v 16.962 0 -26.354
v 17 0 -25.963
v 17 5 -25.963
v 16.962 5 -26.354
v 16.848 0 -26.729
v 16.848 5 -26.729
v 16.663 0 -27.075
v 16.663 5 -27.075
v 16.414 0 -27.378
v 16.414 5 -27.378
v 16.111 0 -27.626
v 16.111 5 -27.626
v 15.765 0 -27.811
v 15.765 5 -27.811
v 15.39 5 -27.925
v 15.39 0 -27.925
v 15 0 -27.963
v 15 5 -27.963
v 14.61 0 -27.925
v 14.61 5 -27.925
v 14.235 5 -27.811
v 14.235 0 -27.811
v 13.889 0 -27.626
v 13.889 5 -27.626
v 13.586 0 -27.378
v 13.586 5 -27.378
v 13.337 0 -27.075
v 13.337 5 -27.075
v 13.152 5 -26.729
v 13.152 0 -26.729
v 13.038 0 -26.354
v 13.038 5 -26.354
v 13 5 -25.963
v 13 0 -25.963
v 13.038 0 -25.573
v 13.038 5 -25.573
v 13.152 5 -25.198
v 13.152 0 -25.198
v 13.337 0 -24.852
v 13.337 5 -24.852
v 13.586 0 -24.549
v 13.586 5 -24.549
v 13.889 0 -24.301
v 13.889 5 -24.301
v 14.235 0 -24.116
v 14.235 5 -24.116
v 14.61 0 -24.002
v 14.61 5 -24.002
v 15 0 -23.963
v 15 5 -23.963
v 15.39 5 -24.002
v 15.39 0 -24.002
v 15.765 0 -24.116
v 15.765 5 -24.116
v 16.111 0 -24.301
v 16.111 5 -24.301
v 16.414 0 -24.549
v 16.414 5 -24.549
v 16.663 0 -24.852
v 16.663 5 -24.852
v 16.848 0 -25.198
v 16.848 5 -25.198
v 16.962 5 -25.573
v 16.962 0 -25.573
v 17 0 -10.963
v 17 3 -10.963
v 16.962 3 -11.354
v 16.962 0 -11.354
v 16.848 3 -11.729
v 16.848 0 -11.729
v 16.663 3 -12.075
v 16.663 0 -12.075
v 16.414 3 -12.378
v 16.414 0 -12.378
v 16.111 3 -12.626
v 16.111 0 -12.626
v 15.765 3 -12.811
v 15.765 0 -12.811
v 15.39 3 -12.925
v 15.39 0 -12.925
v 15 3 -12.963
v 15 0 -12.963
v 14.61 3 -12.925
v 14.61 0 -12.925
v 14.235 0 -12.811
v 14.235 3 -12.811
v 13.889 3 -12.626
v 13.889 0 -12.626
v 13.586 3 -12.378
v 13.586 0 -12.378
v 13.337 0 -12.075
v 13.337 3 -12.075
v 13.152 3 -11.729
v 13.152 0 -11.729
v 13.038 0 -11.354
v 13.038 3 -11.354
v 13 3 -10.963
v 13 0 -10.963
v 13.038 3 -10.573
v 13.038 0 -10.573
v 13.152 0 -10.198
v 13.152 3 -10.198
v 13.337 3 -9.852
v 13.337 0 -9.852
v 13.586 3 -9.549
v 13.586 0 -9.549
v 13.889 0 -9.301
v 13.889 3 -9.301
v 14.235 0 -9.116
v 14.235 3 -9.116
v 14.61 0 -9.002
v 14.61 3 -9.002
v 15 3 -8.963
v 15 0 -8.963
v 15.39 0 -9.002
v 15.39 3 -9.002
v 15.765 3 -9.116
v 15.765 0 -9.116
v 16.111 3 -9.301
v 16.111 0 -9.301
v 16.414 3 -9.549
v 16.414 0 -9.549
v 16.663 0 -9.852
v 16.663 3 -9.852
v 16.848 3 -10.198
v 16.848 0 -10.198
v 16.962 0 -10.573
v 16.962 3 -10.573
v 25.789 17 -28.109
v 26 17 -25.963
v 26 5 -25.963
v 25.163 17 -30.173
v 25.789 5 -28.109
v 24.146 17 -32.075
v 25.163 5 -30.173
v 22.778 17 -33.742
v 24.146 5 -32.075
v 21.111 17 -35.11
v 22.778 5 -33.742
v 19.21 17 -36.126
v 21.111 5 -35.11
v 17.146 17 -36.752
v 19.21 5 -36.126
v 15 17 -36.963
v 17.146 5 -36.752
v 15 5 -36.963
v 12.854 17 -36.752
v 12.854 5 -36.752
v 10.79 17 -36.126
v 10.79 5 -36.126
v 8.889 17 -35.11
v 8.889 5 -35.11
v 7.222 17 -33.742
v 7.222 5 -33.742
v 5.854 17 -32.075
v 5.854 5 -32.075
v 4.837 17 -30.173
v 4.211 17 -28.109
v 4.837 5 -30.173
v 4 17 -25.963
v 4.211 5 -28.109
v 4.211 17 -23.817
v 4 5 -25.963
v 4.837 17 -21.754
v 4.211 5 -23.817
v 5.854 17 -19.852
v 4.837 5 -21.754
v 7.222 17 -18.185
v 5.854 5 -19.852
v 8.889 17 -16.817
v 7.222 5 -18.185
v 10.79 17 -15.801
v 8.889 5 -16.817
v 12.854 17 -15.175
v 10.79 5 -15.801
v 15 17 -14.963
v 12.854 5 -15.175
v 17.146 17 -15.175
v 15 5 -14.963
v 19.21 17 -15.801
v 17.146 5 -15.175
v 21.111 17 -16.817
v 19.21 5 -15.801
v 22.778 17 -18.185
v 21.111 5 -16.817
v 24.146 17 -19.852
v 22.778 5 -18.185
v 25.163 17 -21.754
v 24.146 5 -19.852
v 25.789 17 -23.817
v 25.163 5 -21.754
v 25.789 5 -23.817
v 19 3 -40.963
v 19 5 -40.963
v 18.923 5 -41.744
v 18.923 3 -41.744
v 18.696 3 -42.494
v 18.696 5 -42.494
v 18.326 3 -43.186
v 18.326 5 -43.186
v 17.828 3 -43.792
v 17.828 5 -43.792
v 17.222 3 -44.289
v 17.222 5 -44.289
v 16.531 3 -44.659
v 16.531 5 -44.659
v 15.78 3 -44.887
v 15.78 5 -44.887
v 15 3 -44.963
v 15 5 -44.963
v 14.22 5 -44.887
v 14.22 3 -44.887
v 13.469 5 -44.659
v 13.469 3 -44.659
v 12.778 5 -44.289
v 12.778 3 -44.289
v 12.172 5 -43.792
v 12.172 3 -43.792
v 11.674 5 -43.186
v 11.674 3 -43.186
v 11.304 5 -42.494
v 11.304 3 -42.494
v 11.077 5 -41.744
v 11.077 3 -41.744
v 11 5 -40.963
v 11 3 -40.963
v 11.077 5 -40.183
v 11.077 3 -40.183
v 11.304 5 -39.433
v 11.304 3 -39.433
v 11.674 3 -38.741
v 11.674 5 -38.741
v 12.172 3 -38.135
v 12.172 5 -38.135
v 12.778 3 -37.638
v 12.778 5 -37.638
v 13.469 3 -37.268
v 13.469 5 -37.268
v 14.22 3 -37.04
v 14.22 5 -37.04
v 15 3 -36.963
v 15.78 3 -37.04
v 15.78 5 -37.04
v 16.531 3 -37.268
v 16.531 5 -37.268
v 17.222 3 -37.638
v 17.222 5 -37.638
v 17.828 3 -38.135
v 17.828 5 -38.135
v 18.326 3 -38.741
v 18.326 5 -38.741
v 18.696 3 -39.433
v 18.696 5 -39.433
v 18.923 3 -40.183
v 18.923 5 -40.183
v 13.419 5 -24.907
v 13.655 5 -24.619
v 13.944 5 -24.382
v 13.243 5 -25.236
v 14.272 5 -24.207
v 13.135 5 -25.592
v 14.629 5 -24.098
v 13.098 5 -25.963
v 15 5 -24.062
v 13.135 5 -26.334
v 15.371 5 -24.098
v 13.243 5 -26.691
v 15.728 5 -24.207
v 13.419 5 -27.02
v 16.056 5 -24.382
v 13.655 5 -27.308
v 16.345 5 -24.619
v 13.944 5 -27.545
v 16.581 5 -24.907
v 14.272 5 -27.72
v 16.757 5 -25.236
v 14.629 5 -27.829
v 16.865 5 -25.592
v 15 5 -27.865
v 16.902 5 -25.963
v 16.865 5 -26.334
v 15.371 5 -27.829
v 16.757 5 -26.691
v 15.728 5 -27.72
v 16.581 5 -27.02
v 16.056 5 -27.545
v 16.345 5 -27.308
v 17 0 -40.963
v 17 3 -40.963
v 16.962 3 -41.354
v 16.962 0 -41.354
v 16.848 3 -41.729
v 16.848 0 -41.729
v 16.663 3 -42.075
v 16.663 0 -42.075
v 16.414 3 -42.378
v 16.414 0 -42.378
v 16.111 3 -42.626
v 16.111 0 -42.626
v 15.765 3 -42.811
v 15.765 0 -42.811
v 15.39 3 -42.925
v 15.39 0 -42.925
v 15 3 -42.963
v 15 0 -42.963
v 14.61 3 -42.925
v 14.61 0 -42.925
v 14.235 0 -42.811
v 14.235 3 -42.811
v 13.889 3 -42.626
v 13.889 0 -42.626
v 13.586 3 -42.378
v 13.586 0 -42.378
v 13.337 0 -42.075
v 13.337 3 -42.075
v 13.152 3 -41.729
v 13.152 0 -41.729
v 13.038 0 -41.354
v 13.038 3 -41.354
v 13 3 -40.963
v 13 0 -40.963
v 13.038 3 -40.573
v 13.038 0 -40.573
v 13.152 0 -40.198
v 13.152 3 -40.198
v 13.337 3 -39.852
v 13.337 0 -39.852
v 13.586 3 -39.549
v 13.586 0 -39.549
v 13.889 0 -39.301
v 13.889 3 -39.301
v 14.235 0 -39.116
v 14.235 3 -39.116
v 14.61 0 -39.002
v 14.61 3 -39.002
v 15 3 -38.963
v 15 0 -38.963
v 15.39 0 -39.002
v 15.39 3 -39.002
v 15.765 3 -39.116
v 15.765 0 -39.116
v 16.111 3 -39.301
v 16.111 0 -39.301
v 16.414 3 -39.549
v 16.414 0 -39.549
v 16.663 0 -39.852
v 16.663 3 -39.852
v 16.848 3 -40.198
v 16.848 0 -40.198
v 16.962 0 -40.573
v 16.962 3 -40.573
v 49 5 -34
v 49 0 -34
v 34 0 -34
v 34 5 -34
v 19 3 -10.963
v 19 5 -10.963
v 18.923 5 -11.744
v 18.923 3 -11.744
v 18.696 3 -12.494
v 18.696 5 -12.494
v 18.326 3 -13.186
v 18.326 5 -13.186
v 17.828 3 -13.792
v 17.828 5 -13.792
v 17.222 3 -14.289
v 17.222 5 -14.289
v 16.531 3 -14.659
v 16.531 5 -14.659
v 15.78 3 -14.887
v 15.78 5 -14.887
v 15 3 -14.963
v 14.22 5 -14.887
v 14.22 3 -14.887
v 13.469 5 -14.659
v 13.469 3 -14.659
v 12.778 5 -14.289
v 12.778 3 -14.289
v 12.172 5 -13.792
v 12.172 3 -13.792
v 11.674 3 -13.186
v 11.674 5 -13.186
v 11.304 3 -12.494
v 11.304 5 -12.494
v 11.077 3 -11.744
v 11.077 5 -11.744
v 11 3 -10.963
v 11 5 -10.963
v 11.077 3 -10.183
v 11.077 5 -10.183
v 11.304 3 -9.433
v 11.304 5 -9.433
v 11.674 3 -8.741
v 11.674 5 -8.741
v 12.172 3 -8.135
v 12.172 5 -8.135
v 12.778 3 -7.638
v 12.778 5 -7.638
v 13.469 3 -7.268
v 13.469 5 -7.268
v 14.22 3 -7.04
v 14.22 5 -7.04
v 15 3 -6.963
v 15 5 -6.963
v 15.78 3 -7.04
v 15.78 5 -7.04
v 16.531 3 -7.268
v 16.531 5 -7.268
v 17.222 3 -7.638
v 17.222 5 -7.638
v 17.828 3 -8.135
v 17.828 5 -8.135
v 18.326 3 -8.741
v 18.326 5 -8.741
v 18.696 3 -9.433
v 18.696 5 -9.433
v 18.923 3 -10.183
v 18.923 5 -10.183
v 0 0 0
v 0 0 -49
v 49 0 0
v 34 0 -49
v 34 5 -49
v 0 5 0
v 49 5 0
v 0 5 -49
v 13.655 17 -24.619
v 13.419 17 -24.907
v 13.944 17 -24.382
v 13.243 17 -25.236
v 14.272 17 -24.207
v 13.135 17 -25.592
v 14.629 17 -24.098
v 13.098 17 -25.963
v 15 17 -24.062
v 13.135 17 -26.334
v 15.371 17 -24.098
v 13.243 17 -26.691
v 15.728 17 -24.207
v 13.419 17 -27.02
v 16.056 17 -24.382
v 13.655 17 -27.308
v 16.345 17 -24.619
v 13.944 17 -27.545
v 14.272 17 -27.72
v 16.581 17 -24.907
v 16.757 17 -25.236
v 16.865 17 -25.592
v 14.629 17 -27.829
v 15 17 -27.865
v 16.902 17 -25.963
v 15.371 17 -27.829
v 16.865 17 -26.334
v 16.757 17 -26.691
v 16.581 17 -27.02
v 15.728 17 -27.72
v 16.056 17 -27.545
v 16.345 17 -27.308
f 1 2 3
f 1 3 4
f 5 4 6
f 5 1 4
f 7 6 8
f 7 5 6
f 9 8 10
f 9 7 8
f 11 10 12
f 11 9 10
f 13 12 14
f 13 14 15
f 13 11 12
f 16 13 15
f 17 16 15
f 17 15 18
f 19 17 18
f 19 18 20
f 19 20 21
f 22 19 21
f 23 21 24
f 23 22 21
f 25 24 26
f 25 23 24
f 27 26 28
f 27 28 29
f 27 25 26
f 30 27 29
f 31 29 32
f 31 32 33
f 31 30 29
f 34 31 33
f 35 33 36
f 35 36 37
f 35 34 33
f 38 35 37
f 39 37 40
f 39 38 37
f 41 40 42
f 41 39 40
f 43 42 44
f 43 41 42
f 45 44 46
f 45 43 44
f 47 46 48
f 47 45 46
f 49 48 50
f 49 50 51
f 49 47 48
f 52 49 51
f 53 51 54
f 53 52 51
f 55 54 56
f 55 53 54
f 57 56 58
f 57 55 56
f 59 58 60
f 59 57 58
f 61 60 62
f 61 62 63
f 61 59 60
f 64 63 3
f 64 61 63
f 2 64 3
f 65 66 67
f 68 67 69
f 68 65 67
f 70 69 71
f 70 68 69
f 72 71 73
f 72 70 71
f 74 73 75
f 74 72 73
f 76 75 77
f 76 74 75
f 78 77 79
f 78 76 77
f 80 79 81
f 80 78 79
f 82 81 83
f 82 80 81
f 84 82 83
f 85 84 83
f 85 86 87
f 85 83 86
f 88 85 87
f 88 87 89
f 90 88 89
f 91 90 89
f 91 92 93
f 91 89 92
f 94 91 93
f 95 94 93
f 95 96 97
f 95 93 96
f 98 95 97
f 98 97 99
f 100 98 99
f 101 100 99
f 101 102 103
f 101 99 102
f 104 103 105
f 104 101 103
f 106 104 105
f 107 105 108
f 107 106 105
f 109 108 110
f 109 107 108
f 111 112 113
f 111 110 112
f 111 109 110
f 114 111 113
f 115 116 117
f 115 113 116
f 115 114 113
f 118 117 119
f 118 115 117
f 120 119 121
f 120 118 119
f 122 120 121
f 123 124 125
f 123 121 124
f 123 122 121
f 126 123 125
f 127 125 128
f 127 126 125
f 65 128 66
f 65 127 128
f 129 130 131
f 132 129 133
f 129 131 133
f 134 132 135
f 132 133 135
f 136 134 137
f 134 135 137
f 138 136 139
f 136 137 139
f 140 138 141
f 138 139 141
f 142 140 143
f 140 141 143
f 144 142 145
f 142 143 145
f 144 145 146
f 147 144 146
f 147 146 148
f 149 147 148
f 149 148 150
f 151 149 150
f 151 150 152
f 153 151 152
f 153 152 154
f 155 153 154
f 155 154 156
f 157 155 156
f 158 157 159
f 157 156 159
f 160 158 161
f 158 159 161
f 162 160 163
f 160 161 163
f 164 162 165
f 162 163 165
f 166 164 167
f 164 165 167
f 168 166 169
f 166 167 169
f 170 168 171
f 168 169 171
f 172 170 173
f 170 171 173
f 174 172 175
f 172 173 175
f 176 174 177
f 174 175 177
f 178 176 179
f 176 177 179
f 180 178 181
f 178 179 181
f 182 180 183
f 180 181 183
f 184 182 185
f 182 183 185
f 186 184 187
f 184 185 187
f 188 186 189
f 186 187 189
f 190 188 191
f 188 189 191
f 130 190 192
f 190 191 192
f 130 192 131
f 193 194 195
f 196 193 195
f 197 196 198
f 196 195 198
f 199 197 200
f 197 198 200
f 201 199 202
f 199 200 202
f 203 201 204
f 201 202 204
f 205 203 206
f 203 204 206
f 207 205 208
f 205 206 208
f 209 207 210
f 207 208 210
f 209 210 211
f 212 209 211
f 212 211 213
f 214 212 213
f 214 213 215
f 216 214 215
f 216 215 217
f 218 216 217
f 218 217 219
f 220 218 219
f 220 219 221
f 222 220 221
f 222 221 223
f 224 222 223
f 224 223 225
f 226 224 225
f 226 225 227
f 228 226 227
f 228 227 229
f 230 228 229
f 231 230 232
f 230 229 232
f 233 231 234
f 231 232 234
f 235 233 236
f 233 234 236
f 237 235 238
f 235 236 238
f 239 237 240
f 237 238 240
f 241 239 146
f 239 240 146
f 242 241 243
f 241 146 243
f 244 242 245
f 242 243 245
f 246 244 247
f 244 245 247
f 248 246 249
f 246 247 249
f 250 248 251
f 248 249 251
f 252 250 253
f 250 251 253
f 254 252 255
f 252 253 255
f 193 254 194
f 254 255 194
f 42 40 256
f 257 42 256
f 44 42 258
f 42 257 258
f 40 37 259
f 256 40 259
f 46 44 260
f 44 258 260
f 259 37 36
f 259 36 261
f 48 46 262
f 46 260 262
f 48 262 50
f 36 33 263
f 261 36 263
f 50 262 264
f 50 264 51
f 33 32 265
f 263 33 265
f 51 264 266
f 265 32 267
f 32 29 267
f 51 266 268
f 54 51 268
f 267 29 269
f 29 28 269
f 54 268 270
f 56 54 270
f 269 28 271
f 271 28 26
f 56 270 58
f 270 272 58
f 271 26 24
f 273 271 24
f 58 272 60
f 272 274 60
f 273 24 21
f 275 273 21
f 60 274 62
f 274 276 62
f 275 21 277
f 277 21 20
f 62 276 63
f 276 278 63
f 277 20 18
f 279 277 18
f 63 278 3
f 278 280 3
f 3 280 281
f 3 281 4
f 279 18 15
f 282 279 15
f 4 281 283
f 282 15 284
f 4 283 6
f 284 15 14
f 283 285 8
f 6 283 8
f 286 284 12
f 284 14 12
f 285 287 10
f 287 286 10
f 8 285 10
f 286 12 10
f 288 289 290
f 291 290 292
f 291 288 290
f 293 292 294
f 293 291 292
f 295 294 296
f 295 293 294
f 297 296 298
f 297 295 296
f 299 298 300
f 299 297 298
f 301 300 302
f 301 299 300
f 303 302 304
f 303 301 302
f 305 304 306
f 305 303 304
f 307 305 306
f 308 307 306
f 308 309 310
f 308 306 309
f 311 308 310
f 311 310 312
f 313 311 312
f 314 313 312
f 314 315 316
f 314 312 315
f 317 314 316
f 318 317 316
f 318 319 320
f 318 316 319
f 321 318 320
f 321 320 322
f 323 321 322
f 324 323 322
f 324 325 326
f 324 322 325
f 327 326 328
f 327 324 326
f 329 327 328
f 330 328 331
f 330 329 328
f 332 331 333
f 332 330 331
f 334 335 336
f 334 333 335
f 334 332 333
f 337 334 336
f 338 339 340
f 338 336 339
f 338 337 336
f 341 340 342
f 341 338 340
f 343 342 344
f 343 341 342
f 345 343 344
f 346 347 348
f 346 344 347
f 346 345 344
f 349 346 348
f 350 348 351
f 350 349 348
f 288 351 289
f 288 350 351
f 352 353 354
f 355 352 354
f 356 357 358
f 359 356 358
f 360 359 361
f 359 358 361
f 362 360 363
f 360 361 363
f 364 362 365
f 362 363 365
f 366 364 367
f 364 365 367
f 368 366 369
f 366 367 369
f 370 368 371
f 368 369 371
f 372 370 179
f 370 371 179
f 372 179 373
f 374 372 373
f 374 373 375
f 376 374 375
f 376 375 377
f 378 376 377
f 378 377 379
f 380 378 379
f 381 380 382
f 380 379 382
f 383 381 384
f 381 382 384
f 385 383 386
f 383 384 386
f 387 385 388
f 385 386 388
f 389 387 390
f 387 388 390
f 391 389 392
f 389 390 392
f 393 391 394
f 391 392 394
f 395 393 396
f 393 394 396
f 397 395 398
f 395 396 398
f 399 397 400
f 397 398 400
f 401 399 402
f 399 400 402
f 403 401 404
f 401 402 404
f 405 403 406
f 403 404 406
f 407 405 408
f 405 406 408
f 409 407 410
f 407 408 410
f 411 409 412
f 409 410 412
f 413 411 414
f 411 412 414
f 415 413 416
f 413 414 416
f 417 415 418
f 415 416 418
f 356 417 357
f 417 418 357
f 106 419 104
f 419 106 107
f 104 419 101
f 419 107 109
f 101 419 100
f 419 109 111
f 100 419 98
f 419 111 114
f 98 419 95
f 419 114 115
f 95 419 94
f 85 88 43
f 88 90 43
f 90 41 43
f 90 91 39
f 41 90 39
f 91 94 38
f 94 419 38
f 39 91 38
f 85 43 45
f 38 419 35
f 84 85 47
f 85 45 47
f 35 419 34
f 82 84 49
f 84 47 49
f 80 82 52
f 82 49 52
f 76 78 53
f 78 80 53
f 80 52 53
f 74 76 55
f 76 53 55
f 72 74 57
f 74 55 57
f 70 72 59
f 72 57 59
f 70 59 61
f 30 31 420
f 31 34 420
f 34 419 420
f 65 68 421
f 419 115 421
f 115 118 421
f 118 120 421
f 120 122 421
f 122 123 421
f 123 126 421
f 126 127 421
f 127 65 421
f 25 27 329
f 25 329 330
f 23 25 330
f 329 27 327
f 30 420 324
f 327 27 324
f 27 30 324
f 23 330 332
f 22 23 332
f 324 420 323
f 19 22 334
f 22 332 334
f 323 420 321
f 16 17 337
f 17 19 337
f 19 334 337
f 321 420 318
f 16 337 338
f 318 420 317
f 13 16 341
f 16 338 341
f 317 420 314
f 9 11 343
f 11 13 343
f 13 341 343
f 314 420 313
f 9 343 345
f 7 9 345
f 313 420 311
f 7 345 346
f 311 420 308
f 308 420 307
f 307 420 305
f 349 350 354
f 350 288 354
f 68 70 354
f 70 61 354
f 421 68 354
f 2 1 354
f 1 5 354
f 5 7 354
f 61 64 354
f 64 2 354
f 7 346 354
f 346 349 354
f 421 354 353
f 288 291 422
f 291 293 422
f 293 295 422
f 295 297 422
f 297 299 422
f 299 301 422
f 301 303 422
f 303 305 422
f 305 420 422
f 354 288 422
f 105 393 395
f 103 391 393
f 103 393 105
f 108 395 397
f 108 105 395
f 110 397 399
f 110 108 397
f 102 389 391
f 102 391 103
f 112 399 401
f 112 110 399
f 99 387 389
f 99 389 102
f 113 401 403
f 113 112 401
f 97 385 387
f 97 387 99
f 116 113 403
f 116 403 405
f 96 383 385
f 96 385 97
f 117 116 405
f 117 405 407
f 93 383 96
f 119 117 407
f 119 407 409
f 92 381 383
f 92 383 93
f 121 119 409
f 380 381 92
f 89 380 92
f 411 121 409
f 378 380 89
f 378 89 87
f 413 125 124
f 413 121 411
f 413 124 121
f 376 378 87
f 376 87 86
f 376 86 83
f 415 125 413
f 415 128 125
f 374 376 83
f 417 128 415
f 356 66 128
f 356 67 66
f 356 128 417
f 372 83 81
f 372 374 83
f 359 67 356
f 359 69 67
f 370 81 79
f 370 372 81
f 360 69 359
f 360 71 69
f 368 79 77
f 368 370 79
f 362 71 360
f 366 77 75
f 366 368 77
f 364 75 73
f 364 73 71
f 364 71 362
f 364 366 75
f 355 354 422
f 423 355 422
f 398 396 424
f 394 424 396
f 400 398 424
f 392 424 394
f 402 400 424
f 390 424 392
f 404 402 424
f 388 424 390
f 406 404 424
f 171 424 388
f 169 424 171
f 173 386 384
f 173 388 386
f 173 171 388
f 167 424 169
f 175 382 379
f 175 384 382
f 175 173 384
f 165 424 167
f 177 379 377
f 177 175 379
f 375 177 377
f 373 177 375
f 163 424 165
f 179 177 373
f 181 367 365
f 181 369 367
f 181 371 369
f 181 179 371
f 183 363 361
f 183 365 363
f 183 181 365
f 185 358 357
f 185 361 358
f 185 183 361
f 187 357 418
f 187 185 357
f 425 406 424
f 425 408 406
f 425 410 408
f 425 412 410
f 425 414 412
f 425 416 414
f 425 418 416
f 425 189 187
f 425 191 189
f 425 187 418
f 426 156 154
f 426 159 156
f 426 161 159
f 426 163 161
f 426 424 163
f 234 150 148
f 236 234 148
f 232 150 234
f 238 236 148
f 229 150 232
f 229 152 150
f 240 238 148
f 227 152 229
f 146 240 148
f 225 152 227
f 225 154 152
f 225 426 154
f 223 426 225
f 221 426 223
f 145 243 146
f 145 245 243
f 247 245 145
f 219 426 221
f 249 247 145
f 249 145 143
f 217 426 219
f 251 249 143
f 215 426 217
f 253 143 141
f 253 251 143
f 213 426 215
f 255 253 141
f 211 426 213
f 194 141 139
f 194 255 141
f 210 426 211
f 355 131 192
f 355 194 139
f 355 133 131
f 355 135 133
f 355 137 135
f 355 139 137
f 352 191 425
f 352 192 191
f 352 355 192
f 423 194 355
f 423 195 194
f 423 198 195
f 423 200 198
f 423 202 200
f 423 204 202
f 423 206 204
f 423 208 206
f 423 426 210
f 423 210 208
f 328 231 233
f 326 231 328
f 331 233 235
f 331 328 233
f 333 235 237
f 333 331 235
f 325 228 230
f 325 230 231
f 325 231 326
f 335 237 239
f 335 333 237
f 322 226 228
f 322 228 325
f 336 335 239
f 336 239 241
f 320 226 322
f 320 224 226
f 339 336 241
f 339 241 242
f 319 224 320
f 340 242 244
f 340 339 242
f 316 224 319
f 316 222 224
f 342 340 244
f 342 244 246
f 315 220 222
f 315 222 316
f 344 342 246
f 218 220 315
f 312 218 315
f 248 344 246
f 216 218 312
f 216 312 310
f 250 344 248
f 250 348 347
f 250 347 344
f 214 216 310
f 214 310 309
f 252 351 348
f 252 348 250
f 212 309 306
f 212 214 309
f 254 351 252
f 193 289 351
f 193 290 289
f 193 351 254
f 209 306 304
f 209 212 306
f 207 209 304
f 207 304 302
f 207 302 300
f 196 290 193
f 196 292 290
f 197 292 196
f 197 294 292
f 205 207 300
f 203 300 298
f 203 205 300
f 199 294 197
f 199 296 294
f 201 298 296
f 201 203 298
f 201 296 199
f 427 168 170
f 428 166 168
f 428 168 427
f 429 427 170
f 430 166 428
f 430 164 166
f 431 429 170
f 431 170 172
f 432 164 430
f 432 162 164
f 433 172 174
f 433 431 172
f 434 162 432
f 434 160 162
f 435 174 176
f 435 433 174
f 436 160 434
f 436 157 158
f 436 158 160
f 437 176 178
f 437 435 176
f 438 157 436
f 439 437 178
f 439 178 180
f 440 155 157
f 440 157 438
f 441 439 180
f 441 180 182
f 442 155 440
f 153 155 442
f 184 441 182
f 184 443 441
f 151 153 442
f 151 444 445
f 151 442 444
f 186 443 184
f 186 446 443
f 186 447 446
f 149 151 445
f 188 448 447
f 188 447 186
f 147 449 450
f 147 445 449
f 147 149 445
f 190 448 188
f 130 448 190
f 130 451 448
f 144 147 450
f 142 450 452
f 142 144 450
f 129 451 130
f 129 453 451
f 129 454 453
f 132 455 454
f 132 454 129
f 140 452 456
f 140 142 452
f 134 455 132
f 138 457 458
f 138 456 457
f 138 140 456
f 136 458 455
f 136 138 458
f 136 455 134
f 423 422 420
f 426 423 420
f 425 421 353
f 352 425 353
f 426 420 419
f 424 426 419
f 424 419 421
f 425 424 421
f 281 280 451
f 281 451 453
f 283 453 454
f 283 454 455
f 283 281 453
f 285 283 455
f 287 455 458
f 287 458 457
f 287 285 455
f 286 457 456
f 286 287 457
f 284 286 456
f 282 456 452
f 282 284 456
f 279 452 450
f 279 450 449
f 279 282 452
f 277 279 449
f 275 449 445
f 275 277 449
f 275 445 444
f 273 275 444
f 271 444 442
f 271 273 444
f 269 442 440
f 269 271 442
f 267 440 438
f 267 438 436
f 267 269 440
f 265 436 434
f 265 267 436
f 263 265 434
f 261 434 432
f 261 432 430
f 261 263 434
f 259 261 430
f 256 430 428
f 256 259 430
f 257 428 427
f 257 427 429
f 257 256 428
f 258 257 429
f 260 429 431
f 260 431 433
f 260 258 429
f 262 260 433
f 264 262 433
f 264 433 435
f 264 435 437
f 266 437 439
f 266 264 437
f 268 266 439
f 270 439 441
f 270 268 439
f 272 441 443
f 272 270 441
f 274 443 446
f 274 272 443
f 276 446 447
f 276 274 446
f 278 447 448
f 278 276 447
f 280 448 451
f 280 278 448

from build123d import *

# Parameters (mm, degrees)
SKETCH1_R           = 2
BOSS_EXTRUDE1_DEPTH = 5
SKETCH2_R           = 4
CUT_EXTRUDE1_DEPTH  = 2
SKETCH3_R           = 11
SKETCH3_R_2         = 1.901621635
BOSS_EXTRUDE2_DEPTH = 12


with BuildPart() as part:
    # Sketch1 → Boss-Extrude1 (new body)
    with BuildSketch(Plane(origin=(0, 0, 0), x_dir=(1, 0, 0), z_dir=(0, 1, 0))):
        Polygon((0, 49), (0, 0), (49, 0), (49, 34), (34, 34), (34, 49), align=None)
        with Locations((15, 10.96347032)):
            Circle(SKETCH1_R, mode=Mode.SUBTRACT)
        with Locations((15, 25.96347032)):
            Circle(SKETCH1_R, mode=Mode.SUBTRACT)
        with Locations((15, 40.96347032)):
            Circle(SKETCH1_R, mode=Mode.SUBTRACT)
    extrude(amount=BOSS_EXTRUDE1_DEPTH)

    # Sketch2 → Cut-Extrude1 (cut)
    with BuildSketch(Plane(origin=(0, 5, 0), x_dir=(1, 0, 0), z_dir=(0, 1, 0))):
        with Locations((15, 40.96347032)):
            Circle(SKETCH2_R)
        with Locations((15, 10.96347032)):
            Circle(SKETCH2_R)
    extrude(amount=-CUT_EXTRUDE1_DEPTH, mode=Mode.SUBTRACT)

    # Sketch3 → Boss-Extrude2 (add)
    with BuildSketch(Plane(origin=(0, 5, 0), x_dir=(1, 0, 0), z_dir=(0, 1, 0))):
        with Locations((15, 25.96347032)):
            Circle(SKETCH3_R)
        with Locations((15, 25.96347032)):
            Circle(SKETCH3_R_2, mode=Mode.SUBTRACT)
    extrude(amount=BOSS_EXTRUDE2_DEPTH)


solid = part.part
